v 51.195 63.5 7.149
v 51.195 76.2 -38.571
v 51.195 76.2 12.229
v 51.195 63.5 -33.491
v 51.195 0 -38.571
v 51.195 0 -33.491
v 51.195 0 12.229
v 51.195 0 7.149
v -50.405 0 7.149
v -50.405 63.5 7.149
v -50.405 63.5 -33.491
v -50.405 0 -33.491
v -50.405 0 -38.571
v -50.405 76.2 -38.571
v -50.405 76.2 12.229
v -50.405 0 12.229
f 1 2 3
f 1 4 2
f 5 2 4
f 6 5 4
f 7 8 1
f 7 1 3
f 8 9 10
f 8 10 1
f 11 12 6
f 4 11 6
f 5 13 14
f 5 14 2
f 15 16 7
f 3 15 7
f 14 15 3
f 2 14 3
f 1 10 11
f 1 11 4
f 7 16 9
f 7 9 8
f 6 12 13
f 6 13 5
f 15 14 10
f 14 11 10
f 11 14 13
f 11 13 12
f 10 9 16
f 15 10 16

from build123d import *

# Parameters (mm, degrees)
F0_W     = 101.6
F0_H     = 50.8
F1_DEPTH = 76.2
F3_W     = 101.6
F3_H     = 40.64
F4_DEPTH = 63.5


# Not quite as in the source:
# - the program builds the solid bodies; features that only make, move or delete a surface that nothing else refers to are left out


with BuildPart() as f1:
    # F0 (on Front) → F1 (new body)
    with BuildSketch(Plane.XZ):
        with Locations((0.3947839141, -13.1712006897)):
            Rectangle(F0_W, F0_H)
    extrude(amount=-F1_DEPTH)

    # F3 (on face) → F4 (cut)
    with BuildSketch(Plane.XZ):
        with Locations((0.3947839141, -13.1712006897)):
            Rectangle(F3_W, F3_H)
    extrude(amount=-F4_DEPTH, mode=Mode.SUBTRACT)


solid = f1.part
